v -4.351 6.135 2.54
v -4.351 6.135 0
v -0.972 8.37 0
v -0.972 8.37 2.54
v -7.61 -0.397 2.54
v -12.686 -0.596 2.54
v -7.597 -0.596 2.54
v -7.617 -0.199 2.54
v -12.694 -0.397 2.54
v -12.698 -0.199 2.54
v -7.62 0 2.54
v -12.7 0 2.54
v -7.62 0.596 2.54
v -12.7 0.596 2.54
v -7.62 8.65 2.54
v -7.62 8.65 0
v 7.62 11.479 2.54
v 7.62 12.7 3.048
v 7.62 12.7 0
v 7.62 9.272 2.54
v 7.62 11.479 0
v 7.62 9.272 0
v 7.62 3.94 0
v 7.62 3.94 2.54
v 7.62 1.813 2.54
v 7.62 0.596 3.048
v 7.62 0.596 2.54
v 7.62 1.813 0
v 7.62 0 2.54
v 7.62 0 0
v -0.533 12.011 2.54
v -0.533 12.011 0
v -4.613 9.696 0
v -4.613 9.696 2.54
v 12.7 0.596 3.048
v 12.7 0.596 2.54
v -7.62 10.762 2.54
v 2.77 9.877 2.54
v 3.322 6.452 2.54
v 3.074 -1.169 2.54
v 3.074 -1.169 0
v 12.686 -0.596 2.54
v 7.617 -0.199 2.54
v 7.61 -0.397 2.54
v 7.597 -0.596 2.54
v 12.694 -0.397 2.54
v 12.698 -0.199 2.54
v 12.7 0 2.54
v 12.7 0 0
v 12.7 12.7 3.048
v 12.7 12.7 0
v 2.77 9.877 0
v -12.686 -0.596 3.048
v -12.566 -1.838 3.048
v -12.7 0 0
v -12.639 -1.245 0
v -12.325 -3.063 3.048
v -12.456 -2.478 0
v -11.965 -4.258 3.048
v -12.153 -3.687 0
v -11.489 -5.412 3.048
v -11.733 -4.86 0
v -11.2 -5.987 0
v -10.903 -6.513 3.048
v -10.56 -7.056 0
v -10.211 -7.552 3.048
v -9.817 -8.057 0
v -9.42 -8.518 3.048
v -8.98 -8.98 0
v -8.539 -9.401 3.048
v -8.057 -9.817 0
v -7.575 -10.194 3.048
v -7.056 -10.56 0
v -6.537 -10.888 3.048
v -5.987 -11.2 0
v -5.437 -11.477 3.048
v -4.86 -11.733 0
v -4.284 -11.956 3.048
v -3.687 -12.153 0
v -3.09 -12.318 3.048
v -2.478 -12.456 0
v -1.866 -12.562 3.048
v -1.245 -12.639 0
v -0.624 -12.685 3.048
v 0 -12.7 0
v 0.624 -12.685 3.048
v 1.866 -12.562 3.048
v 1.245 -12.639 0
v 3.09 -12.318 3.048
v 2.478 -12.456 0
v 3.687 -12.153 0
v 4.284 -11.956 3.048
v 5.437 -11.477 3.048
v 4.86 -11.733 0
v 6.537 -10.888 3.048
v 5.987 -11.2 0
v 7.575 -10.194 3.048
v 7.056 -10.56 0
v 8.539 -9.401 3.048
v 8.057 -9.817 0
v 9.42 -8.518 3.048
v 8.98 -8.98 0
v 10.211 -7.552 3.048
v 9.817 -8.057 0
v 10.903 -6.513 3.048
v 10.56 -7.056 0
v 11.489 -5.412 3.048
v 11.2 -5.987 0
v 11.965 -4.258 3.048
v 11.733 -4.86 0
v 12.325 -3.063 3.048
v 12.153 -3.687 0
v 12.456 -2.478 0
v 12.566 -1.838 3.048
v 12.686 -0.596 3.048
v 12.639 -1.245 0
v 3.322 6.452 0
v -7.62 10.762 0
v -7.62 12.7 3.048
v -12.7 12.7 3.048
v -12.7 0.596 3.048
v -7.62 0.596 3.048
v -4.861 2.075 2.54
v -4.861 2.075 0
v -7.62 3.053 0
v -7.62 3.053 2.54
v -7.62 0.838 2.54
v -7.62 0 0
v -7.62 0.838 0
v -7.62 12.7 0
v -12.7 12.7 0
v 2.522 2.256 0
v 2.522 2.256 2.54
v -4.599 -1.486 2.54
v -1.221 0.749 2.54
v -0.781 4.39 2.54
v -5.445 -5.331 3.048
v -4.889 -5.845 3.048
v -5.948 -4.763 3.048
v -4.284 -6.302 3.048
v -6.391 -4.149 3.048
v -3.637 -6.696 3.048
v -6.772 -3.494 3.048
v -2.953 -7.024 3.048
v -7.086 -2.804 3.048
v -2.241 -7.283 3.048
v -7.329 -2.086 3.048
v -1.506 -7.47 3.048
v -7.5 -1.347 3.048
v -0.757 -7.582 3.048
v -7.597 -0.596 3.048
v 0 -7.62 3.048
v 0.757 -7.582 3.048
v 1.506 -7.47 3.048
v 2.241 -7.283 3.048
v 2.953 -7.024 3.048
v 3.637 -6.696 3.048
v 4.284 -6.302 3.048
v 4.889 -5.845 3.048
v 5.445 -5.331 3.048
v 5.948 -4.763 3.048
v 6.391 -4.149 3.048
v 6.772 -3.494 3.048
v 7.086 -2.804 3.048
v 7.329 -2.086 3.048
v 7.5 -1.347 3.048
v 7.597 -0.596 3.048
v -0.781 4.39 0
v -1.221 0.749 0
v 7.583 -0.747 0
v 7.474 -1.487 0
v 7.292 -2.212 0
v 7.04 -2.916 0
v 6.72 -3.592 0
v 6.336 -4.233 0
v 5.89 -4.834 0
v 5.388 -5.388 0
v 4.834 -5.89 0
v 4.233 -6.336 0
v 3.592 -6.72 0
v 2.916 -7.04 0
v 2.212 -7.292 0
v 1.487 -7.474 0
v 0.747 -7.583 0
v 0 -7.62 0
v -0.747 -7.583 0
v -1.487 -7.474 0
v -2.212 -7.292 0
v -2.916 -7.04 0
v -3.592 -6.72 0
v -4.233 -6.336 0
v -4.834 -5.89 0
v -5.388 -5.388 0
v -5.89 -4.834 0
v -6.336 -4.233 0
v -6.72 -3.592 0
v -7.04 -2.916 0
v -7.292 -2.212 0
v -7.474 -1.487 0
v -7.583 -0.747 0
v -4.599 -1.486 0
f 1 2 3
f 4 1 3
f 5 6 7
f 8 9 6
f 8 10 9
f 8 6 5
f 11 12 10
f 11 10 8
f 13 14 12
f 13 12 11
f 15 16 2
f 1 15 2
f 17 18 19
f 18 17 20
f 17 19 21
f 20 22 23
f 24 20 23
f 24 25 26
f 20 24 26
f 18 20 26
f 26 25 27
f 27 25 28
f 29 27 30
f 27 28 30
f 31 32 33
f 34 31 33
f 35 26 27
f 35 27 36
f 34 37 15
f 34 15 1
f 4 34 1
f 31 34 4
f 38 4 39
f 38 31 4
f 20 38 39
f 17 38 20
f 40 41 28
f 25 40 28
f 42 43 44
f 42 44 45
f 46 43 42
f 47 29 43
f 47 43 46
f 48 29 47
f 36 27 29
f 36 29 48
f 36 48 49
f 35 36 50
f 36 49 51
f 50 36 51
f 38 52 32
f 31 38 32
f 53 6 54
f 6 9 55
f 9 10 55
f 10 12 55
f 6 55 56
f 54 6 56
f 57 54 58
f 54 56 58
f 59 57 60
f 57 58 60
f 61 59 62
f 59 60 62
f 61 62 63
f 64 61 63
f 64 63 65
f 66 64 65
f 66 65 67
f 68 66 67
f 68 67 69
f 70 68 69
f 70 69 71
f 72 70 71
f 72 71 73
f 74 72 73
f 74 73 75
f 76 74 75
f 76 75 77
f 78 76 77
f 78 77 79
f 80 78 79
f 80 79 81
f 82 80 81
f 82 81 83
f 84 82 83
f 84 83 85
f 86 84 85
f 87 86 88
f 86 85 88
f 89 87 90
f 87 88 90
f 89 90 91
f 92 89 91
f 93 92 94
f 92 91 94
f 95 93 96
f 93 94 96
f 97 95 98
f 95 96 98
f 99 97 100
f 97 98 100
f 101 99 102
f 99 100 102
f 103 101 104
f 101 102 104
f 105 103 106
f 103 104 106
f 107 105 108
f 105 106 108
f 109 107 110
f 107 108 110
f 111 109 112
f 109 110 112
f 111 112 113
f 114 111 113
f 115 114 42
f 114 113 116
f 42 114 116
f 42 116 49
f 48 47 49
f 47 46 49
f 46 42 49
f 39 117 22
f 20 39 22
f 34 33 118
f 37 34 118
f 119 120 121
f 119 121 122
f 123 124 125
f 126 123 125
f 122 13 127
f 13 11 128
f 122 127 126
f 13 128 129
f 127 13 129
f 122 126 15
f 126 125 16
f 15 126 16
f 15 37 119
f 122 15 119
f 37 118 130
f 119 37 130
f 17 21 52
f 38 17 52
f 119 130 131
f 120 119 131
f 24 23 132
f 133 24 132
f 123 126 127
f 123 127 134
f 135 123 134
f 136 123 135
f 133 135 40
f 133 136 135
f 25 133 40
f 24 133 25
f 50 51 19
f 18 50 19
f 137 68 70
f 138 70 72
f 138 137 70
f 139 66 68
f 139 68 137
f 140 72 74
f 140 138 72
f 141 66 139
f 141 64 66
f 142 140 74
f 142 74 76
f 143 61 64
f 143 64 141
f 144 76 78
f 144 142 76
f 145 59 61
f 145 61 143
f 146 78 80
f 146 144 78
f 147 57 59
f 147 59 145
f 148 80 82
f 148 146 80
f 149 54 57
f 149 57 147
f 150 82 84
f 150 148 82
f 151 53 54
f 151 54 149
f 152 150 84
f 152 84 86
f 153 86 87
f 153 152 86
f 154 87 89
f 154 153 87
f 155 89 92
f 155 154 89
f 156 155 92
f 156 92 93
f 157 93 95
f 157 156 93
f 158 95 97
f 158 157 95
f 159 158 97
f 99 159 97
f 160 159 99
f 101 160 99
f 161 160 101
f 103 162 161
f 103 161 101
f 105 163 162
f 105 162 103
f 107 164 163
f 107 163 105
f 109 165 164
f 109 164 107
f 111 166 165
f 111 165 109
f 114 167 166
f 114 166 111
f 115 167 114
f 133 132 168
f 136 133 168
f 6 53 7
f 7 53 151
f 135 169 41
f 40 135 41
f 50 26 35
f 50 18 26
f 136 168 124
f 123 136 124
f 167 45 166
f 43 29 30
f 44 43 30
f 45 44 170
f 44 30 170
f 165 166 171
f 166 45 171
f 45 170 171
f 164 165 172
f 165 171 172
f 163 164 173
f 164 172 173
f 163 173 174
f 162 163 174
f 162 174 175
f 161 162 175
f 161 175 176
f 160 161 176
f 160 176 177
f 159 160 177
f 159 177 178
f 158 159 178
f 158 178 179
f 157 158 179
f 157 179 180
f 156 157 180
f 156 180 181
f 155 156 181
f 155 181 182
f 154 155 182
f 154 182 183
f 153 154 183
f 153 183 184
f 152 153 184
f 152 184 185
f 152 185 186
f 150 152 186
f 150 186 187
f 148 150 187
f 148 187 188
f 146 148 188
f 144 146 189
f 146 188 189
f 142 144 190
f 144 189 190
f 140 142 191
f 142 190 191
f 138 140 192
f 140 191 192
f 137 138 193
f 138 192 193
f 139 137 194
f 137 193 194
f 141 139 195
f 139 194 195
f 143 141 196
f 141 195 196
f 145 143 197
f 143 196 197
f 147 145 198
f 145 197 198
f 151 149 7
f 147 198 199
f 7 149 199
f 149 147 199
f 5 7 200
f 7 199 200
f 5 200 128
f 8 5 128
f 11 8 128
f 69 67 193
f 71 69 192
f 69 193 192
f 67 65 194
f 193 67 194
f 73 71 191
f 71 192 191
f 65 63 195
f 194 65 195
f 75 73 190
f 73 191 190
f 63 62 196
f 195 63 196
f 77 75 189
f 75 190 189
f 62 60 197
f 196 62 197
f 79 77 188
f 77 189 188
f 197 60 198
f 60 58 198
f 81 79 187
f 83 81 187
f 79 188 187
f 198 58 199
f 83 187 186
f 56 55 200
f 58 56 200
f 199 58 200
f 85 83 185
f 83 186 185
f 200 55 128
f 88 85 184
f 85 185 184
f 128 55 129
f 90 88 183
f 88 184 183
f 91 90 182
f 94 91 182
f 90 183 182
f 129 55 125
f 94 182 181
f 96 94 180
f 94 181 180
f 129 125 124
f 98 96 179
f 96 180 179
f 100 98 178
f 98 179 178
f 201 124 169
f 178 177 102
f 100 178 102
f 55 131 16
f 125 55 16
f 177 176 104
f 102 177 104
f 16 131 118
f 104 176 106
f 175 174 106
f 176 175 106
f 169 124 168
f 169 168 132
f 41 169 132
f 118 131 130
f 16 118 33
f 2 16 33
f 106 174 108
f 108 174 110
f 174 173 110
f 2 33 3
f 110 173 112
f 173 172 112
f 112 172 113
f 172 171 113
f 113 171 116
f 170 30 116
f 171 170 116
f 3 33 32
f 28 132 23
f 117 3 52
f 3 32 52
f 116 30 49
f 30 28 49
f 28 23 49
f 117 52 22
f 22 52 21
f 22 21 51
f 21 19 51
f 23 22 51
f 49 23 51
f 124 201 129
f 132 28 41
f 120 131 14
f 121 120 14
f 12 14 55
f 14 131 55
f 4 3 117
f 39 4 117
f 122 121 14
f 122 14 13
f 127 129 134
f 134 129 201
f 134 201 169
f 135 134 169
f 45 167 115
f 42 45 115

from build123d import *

# Parameters (mm, degrees)
F1_DEPTH = 3.048
F3_DEPTH = 2.54
F4_W     = 29.287648
F4_H     = 1.191522
F5_DEPTH = 0.508


with BuildPart() as f1:
    # F0 (on Top) → F1 (new body)
    with BuildSketch(Plane.XY):
        with BuildLine():
            Line((12.7, 0), (12.7, 12.7))
            Line((12.7, 12.7), (7.62, 12.7))
            Line((7.62, 12.7), (7.62, 0))
            ThreePointArc((7.62, 0), (0, -7.62), (-7.62, 0))
            Line((-7.62, 0), (-7.62, 12.7))
            Line((-7.62, 12.7), (-12.7, 12.7))
            Line((-12.7, 12.7), (-12.7, 0))
            ThreePointArc((-12.7, 0), (0, -12.7), (12.7, 0))
        make_face()
    extrude(amount=F1_DEPTH)

    # F2 (on Top) → F3 (join)
    with BuildSketch(Plane.XY):
        Polygon((-4.612858, 9.695881), (-8.65593, 11.129335), (-8.692686, 9.47535), (-4.351111, 6.134733), (-0.97243, 8.36986), (3.321907, 6.452318), (9.611405, 10.578007), (8.770715, 11.859614), (2.770109, 9.877271), (-0.53303, 12.011459), align=None)
        Polygon((-4.860972, 2.074731), (-8.904044, 3.508184), (-8.940799, 1.8542), (-4.599224, -1.486418), (-1.220543, 0.74871), (3.073793, -1.168832), (9.363291, 2.956856), (8.522601, 4.238464), (2.521995, 2.256121), (-0.781144, 4.390309), align=None)
    extrude(amount=F3_DEPTH)

    # F4 (on face) → F5 (cut)
    with BuildSketch(Plane.XY.offset(3.048)):
        Rectangle(F4_W, F4_H)
    extrude(amount=-F5_DEPTH, mode=Mode.SUBTRACT)


solid = f1.part
